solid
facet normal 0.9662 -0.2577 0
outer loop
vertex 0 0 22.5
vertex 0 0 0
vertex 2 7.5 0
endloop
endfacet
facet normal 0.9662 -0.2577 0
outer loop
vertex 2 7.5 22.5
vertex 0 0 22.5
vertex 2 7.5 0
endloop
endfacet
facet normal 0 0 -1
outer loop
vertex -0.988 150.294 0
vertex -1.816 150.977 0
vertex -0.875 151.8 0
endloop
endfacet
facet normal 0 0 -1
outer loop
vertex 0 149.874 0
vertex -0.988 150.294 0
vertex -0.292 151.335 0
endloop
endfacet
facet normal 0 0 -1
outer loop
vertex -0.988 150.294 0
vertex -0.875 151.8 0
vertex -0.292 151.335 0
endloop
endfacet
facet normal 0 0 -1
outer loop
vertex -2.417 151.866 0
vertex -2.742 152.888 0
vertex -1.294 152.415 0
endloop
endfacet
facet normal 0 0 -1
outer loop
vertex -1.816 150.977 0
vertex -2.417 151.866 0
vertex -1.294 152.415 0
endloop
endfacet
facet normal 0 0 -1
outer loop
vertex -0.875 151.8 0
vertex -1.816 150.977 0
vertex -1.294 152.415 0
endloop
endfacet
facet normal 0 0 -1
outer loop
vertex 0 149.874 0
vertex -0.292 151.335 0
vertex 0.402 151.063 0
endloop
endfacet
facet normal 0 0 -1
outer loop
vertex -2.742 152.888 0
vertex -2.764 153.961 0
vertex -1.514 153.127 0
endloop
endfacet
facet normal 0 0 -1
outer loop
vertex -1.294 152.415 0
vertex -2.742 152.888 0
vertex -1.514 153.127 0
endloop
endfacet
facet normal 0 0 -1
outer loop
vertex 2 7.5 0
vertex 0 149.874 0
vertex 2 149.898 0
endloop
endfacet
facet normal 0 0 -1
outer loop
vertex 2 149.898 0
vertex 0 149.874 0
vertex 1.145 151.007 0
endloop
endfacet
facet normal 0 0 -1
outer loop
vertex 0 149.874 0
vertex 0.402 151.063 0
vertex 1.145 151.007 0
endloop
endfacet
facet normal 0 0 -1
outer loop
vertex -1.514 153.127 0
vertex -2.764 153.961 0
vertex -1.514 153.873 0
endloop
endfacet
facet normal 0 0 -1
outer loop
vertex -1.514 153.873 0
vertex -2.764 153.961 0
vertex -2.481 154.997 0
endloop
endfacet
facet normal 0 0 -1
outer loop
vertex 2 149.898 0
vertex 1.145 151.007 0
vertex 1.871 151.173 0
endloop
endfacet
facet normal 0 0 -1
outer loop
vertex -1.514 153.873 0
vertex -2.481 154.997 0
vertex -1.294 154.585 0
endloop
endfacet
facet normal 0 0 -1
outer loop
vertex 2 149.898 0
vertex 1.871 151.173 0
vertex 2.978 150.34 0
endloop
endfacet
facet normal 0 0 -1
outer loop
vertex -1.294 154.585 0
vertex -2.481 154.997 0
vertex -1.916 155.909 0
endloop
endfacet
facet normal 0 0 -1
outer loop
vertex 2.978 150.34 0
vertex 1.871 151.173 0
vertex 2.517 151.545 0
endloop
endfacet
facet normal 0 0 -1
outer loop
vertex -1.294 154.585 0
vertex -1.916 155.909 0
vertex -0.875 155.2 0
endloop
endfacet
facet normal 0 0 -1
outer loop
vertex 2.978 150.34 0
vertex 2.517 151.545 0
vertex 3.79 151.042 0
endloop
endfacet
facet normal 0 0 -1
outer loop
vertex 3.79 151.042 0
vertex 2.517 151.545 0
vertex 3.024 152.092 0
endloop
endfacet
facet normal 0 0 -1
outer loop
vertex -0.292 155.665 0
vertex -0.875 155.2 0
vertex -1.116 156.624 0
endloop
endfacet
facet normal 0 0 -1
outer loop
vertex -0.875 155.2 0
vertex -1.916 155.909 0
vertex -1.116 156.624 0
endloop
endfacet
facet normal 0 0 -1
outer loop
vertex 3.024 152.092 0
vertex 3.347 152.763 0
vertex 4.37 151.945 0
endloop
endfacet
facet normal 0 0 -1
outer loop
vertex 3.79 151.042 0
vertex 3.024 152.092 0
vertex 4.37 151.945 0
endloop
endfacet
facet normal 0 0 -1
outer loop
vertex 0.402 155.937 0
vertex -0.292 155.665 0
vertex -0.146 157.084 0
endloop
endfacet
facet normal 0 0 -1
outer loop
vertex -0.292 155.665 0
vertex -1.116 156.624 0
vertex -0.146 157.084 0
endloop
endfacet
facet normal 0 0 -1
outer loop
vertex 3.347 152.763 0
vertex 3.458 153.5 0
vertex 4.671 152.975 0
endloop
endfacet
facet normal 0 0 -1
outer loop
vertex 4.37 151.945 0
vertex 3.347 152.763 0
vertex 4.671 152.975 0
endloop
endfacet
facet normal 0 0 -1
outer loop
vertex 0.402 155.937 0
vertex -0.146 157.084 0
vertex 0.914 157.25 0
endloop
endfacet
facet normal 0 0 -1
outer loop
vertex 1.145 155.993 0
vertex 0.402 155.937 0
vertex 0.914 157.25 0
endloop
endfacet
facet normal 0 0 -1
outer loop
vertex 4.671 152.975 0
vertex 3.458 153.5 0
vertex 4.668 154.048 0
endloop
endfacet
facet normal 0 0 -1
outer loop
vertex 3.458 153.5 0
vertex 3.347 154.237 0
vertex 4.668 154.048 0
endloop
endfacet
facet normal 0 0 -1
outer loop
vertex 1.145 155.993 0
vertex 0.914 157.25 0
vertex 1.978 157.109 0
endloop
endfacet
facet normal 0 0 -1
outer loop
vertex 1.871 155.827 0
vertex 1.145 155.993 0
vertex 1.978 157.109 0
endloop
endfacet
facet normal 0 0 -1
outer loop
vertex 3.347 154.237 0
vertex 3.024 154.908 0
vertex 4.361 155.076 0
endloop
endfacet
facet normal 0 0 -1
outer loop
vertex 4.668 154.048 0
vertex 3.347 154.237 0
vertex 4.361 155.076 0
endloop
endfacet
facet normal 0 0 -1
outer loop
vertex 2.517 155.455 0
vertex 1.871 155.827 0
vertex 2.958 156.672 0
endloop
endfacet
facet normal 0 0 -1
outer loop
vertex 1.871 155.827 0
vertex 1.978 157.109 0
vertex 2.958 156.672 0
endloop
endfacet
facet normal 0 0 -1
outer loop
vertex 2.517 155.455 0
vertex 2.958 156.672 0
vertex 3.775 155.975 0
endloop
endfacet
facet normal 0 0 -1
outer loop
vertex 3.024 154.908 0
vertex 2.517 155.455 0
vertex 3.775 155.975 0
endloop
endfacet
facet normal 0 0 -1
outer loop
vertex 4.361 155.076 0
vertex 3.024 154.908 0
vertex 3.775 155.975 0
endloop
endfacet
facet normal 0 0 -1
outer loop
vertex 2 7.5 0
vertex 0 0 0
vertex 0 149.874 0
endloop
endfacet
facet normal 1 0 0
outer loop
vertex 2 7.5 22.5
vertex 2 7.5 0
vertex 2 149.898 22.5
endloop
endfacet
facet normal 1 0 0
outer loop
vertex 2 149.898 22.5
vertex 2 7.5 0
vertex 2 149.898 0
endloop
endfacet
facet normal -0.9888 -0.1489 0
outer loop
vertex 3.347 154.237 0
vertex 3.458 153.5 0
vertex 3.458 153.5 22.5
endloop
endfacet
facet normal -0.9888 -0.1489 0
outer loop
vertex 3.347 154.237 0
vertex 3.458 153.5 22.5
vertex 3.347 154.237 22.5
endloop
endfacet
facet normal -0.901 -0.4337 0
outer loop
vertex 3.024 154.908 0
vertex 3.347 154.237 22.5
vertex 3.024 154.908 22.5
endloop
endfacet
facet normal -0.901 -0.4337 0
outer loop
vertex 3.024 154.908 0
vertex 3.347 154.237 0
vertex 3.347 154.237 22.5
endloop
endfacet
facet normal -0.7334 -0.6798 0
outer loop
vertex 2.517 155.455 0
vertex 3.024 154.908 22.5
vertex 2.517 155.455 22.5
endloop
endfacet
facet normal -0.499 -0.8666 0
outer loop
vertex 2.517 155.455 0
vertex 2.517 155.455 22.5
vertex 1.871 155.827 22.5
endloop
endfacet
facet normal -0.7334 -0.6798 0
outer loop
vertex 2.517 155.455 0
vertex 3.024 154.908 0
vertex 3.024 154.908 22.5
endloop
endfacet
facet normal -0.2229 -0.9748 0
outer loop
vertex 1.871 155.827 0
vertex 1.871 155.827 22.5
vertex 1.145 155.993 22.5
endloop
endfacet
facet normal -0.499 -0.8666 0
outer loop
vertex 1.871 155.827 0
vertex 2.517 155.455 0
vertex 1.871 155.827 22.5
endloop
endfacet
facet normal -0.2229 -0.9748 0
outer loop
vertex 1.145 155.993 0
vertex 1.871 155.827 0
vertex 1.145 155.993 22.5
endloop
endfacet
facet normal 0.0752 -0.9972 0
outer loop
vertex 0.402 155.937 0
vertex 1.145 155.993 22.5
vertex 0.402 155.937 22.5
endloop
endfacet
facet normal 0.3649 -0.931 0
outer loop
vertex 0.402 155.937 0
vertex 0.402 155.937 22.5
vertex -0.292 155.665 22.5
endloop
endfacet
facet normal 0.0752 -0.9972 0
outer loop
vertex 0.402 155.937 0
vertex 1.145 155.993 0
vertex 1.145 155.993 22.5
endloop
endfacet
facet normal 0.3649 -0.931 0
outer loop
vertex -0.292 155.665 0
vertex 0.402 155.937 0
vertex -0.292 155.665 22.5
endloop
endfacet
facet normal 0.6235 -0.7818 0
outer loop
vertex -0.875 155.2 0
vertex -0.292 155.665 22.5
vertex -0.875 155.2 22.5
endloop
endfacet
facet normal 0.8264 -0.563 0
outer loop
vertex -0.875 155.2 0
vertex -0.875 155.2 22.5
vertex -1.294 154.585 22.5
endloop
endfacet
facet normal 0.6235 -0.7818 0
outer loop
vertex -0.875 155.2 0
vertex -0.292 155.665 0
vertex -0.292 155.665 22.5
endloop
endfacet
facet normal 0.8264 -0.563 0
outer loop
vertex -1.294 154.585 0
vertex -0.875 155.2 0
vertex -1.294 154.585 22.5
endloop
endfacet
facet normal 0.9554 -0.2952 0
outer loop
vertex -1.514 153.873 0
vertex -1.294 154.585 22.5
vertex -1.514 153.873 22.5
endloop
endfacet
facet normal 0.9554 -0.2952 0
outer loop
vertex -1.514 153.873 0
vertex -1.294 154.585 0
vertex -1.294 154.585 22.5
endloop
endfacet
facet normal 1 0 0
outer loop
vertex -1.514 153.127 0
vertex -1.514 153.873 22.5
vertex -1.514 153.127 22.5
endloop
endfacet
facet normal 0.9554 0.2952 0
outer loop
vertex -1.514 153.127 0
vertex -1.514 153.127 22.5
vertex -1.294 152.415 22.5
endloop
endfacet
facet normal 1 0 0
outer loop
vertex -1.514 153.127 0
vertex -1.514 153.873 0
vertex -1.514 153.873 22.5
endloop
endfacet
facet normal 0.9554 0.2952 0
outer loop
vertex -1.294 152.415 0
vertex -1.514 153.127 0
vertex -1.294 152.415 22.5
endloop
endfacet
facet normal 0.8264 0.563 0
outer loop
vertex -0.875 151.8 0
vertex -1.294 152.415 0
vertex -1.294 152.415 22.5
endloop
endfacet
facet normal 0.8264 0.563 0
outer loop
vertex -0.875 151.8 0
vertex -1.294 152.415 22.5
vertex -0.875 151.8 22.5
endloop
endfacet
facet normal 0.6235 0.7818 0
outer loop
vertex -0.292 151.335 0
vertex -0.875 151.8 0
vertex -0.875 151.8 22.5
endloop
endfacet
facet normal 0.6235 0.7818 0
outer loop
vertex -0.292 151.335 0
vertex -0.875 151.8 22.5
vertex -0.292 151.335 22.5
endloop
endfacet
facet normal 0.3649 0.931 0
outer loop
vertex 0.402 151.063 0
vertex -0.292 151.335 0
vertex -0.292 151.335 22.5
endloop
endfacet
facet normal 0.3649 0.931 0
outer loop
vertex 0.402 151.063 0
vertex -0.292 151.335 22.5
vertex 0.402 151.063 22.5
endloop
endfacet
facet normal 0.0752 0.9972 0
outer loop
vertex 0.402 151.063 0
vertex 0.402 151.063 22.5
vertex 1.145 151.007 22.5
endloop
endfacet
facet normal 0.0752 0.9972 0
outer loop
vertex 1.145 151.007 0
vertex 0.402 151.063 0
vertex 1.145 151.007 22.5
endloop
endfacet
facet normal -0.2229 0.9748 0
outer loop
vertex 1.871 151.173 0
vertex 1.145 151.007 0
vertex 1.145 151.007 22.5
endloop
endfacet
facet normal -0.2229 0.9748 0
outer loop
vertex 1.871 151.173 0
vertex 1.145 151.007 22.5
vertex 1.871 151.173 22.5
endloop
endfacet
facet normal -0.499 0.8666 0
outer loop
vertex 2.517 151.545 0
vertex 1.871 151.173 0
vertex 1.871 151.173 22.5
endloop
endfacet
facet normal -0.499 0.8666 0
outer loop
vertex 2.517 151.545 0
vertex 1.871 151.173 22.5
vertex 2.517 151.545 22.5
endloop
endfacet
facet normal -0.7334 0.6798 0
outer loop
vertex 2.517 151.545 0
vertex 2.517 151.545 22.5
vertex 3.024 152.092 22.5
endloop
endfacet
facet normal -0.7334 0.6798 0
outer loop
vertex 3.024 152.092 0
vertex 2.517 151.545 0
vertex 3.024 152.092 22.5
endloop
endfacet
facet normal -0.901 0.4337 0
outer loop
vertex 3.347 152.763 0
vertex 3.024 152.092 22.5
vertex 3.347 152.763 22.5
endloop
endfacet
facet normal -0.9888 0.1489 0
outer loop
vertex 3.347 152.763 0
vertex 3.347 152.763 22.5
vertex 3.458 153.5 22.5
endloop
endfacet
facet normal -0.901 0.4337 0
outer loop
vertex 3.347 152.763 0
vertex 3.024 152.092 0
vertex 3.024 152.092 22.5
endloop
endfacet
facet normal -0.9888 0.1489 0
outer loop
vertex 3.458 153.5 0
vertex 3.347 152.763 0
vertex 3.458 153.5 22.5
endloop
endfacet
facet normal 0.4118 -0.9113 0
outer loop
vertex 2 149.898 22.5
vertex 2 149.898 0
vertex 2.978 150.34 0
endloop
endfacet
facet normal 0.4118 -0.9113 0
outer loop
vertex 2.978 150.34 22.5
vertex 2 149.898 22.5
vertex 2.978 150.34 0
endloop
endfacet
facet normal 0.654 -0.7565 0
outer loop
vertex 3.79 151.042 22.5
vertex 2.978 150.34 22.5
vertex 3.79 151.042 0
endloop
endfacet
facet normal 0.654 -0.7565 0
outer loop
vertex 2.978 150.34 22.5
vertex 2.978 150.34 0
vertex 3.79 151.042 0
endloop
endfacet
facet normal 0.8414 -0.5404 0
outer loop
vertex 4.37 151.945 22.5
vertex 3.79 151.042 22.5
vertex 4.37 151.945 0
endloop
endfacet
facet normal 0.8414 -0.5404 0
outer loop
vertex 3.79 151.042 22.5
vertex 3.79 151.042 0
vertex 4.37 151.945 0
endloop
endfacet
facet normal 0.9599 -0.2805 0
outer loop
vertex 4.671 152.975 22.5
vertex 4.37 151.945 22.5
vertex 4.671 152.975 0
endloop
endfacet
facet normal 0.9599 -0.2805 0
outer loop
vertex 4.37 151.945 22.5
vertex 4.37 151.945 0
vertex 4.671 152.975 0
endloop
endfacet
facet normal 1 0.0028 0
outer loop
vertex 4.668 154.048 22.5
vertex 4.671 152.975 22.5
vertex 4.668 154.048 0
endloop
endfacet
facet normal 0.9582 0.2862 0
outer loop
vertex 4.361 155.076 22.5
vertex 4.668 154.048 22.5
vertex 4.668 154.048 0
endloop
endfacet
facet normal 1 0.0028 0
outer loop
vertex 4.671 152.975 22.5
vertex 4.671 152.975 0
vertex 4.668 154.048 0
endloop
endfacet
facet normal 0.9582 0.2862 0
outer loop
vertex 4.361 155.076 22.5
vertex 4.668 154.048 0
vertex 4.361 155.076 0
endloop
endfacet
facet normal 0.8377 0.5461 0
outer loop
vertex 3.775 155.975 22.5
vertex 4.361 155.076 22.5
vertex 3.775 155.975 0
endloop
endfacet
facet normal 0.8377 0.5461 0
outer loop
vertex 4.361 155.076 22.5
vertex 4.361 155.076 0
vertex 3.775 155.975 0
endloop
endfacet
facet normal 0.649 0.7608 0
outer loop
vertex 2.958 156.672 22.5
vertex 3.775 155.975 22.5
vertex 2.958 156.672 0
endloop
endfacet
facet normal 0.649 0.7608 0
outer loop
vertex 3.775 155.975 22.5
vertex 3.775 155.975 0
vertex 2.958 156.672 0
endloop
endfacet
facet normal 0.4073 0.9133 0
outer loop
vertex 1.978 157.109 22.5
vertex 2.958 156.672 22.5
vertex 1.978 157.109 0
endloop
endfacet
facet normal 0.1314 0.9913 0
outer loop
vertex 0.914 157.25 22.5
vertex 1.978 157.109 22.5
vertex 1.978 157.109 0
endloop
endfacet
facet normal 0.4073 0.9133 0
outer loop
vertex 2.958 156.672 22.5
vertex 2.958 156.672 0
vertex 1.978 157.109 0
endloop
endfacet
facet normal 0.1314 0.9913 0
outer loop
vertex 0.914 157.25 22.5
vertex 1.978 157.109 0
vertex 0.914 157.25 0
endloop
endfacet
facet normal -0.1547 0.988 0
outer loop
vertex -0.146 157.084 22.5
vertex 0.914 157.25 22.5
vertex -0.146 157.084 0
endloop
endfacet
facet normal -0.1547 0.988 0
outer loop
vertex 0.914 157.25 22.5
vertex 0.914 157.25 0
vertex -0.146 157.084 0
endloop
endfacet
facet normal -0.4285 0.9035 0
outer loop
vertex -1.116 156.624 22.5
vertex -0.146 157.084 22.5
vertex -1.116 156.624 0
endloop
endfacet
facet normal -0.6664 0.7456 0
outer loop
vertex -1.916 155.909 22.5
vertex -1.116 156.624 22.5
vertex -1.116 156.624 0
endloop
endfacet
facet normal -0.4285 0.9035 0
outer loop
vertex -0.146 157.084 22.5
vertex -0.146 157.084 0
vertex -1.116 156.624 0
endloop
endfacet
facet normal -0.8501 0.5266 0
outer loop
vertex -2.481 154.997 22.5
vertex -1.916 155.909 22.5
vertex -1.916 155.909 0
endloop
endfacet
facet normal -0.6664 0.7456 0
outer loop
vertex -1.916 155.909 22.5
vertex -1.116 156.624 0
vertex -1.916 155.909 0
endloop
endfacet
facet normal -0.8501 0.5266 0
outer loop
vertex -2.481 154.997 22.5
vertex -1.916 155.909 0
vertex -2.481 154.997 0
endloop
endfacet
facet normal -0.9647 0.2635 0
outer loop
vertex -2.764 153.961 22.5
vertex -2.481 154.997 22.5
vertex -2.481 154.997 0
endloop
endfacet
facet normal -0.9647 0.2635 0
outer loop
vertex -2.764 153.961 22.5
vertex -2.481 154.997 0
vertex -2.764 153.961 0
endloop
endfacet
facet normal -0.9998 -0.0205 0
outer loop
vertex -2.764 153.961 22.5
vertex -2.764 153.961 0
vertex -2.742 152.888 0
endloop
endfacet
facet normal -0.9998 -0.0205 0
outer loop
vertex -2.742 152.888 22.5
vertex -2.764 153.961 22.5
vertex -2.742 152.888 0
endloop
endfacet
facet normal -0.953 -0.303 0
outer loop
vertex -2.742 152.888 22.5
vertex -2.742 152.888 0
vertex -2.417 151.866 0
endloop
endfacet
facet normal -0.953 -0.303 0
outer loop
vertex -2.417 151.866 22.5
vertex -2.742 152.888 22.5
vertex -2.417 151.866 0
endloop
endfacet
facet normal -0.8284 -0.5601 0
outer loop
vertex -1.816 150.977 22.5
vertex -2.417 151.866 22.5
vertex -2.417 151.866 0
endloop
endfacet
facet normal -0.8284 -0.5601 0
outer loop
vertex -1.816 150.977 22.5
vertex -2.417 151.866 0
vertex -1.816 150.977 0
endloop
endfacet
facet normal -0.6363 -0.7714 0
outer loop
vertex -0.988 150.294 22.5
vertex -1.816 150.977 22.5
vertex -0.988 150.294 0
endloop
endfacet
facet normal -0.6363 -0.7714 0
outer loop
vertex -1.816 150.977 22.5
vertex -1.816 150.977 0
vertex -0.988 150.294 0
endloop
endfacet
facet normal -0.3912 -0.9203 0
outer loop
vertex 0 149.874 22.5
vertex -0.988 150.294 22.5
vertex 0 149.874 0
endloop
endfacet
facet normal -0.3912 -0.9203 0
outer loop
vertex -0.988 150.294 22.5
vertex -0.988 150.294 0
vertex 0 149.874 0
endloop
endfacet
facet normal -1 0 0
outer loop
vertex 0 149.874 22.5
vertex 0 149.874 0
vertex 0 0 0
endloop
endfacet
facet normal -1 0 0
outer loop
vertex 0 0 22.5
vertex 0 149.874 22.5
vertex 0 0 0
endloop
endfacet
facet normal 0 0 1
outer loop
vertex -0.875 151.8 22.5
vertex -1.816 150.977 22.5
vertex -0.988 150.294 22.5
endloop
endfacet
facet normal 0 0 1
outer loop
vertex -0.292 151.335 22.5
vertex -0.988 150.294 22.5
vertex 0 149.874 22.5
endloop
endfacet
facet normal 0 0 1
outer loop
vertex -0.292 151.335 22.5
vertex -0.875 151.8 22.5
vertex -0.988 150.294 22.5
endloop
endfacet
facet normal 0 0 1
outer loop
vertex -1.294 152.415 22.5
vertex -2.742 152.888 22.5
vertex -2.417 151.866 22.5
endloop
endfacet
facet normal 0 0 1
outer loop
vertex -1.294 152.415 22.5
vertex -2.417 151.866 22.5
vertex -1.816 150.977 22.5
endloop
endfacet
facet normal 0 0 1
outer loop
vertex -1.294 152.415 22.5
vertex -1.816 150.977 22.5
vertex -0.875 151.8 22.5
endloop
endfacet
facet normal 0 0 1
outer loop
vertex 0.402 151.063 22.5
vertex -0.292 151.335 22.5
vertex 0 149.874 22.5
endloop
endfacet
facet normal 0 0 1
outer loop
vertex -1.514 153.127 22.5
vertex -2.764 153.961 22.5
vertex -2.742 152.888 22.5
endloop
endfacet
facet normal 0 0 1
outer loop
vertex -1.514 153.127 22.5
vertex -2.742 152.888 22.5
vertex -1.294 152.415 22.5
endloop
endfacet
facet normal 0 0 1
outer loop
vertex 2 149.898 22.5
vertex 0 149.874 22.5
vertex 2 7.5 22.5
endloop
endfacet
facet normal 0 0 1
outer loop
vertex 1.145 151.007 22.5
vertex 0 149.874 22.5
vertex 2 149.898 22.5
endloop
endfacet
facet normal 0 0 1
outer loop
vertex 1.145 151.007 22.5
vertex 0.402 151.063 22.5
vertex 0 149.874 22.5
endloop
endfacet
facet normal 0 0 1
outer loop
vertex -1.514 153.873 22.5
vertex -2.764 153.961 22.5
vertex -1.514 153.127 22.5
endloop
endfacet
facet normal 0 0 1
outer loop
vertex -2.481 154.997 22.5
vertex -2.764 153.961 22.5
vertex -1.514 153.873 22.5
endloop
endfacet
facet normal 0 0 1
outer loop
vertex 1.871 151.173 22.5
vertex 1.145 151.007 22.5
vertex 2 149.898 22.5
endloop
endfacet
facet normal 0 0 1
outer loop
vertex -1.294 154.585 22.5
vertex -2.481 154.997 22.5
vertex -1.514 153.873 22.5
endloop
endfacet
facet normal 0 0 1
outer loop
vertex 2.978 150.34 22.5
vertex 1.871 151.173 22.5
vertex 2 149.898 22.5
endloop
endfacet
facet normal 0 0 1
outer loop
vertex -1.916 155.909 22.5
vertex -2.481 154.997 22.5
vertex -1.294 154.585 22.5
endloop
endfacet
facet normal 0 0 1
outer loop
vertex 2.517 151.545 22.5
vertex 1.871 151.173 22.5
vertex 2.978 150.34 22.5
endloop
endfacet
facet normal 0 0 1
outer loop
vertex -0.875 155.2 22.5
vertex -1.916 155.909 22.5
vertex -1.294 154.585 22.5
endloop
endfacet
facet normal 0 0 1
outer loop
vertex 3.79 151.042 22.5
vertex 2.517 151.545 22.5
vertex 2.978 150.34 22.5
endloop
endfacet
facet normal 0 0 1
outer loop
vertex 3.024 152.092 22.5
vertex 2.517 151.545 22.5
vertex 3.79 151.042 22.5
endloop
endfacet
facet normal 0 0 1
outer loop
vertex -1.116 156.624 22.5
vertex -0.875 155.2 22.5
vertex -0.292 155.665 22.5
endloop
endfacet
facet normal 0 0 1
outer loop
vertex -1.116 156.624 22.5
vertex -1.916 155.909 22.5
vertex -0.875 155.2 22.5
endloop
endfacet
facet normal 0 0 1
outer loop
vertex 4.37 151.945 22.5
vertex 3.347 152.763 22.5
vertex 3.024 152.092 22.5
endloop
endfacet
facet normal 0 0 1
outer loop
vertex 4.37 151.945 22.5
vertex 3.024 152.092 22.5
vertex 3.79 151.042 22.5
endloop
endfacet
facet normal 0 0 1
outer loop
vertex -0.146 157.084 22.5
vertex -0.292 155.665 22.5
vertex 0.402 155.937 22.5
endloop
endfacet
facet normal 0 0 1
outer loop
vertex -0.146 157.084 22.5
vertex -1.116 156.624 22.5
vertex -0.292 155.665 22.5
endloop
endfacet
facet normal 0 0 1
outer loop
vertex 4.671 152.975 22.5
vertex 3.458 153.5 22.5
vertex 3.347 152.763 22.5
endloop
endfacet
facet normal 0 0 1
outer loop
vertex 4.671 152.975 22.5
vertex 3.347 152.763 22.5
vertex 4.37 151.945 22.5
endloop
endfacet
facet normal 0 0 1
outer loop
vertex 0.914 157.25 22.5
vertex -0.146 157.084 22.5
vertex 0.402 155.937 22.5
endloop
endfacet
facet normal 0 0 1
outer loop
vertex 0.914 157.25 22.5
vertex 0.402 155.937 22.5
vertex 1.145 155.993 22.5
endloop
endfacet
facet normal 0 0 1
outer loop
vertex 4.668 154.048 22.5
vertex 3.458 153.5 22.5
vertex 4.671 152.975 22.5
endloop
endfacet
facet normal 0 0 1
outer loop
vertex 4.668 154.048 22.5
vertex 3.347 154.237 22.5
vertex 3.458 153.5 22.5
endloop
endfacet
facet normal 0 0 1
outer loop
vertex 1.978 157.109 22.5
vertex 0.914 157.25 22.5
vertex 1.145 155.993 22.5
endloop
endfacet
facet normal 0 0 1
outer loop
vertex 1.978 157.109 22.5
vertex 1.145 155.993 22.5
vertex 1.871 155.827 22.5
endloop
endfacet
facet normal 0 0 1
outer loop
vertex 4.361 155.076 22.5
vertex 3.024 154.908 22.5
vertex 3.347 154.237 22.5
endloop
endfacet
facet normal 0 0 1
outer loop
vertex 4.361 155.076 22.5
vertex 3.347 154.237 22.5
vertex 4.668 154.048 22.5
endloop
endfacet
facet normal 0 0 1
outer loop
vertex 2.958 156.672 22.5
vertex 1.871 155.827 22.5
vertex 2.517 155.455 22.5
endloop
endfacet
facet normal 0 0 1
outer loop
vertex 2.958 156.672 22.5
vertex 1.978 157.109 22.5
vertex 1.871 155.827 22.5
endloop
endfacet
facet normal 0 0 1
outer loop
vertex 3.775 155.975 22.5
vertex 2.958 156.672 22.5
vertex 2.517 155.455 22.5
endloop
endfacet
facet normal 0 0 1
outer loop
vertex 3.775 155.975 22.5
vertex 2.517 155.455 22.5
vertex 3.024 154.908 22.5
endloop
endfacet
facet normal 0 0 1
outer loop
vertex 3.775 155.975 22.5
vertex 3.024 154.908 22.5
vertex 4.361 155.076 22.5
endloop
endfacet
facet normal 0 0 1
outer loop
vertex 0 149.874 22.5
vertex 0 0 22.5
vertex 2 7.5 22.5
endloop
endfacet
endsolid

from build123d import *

# Parameters (mm, degrees)
CROQUIS1_R              = 3.75
CROQUIS1_R_2            = 2.5
SALIENTE_EXTRUIR1_DEPTH = 22.5


with BuildPart() as part:
    # Croquis1 → Saliente-Extruir1 (new body)
    with BuildSketch(Plane.XY):
        with Locations((0.957931978, 153.5)):
            Circle(CROQUIS1_R)
        with Locations((0.957931978, 153.5)):
            Circle(CROQUIS1_R_2, mode=Mode.SUBTRACT)
        with BuildLine():
            ThreePointArc((2, 149.897695982), (1.001580793, 149.750254038), (0, 149.874415037))
            Line((0, 149.874415037), (0, 0))
            Line((0, 0), (2, 7.5))
            Line((2, 7.5), (2, 149.897695982))
        make_face()
    extrude(amount=SALIENTE_EXTRUIR1_DEPTH)


solid = part.part
